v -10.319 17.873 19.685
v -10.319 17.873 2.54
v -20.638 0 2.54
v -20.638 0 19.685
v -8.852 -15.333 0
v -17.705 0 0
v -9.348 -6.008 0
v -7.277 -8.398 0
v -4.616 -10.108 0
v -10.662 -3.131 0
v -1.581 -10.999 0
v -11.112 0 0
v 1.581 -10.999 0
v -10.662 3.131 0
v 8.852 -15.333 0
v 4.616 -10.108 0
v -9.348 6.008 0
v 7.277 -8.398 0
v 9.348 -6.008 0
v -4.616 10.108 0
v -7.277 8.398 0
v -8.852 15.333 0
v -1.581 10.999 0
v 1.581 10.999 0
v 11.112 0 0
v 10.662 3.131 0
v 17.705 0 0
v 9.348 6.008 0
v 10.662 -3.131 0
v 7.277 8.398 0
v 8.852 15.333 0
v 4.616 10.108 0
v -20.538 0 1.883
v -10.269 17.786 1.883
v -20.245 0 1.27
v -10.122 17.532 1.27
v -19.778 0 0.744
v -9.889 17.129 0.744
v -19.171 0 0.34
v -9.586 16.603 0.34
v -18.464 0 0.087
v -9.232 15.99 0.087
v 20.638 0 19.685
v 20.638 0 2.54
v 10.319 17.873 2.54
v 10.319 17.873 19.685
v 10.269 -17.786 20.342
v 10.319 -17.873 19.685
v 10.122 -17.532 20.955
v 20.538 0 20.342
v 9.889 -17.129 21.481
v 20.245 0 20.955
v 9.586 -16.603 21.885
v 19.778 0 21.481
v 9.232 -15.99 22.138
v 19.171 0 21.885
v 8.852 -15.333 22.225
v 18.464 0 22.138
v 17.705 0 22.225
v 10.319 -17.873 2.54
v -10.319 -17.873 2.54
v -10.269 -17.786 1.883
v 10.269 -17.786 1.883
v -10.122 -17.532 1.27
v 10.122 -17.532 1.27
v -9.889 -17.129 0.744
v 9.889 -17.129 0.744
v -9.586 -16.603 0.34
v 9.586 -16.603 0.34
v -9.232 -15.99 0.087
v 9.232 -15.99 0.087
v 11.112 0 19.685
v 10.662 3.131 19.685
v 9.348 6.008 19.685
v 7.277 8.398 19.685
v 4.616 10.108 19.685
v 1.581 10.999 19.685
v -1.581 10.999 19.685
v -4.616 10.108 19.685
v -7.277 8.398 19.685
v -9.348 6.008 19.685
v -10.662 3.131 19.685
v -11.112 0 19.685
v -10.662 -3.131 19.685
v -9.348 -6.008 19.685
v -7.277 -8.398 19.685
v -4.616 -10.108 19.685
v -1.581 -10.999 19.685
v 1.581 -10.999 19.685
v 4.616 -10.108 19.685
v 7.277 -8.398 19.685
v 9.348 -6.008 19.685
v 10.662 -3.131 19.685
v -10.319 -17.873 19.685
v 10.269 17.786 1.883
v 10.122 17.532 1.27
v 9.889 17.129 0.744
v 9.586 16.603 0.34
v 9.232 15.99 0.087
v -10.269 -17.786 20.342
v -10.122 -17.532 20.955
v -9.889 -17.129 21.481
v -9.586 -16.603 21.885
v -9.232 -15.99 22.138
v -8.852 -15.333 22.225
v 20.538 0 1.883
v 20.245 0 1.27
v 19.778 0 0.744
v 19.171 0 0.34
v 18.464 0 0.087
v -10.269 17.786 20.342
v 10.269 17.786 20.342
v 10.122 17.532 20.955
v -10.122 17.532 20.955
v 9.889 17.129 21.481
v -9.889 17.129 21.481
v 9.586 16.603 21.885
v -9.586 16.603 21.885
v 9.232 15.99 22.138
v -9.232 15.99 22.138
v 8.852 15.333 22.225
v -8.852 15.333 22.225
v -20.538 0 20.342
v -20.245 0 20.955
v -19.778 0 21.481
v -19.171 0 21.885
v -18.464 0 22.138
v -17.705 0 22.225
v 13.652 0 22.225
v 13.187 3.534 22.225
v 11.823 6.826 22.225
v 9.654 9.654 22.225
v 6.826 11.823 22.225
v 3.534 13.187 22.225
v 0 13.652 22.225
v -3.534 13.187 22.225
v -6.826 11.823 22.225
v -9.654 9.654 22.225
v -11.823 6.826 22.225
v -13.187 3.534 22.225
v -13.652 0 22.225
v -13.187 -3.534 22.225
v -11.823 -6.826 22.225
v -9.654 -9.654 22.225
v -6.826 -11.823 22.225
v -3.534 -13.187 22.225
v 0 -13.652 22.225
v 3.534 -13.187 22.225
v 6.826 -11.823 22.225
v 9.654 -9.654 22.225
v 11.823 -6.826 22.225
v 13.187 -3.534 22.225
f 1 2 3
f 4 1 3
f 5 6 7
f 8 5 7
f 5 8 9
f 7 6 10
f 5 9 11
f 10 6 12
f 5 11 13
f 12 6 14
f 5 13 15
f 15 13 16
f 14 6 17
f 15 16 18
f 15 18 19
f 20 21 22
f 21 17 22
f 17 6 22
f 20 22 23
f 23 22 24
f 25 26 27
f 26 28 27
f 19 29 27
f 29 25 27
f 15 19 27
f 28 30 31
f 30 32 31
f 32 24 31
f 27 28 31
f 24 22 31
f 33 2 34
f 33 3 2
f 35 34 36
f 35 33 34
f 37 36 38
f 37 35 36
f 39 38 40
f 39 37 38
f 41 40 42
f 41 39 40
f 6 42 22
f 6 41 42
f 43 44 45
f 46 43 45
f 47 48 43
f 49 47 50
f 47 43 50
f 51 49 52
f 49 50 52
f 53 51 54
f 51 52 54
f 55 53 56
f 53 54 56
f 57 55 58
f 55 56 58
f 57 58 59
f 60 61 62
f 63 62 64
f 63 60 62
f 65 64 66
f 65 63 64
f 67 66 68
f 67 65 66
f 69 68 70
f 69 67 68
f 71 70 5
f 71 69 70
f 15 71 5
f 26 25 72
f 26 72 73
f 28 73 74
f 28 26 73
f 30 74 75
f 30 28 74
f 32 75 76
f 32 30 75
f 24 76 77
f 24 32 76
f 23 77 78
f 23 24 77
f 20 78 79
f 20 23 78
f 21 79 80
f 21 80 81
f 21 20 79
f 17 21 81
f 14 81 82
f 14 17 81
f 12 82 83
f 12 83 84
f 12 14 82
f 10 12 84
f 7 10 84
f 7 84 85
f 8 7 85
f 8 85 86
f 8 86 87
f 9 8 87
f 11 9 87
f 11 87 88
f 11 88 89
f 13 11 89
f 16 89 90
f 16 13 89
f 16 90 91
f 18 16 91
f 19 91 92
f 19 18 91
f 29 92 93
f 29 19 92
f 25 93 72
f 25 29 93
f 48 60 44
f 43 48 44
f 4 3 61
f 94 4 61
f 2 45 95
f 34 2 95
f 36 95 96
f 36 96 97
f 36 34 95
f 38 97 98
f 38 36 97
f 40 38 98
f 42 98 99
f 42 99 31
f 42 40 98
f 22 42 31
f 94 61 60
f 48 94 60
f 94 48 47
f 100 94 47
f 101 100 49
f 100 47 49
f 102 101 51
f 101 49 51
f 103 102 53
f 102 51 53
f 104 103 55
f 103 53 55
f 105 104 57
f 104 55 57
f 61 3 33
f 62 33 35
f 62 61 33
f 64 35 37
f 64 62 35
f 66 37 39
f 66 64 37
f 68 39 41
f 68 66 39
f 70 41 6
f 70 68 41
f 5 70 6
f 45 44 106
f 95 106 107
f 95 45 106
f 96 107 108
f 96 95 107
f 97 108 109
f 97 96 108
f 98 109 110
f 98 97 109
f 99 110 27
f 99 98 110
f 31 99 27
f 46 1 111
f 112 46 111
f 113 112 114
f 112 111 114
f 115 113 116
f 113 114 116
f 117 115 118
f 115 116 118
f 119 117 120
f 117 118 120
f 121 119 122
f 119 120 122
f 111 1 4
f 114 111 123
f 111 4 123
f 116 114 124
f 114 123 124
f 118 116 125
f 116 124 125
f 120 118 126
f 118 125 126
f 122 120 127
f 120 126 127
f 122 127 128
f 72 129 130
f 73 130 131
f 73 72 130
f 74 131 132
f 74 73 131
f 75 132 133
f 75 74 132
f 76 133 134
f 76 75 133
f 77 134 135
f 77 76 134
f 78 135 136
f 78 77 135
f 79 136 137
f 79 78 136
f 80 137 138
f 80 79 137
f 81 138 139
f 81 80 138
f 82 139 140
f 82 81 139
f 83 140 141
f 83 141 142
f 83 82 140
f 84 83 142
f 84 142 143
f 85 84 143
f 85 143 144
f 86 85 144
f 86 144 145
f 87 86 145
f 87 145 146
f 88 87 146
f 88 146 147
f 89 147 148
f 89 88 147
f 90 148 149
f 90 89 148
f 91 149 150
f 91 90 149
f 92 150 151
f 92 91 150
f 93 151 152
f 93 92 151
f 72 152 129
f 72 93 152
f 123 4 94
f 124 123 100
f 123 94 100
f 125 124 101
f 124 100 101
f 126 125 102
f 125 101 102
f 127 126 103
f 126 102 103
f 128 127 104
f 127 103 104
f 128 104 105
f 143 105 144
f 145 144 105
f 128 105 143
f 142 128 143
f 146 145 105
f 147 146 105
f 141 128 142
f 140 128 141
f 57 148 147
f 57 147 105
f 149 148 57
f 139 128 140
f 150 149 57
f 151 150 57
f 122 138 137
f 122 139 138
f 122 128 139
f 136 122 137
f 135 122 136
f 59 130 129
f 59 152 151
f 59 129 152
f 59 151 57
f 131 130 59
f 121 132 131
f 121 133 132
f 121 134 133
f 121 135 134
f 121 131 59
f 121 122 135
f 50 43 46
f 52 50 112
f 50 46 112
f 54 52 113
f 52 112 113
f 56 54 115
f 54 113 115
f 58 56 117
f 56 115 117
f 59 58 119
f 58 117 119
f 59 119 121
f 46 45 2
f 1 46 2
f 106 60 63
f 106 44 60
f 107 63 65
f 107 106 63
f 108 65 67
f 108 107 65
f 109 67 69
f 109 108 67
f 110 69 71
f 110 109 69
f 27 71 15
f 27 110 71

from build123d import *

# Parameters (mm, degrees)
F0_R     = 11.1125
F1_DEPTH = 22.225
F2_R     = 2.54
F3_SIZE  = 2.54


with BuildPart() as f1:
    # F0 (on Top) → F1 (new body)
    with BuildSketch(Plane.XY):
        Polygon((10.31875, -17.872599), (20.6375, 0), (10.31875, 17.872599), (-10.31875, 17.872599), (-20.6375, 0), (-10.31875, -17.872599), align=None)
        Circle(F0_R, mode=Mode.SUBTRACT)
    extrude(amount=F1_DEPTH)

    # F2
    f2_edges = [f1.edges().sort_by_distance(p)[0] for p in [
        (0, -17.872599, 22.225),
        (15.478125, -8.9363, 22.225),
        (15.478125, 8.9363, 22.225),
        (0, 17.872599, 22.225),
        (-15.478125, 8.9363, 22.225),
        (-15.478125, -8.9363, 22.225),
        (0, -17.872599, 0),
        (-15.478125, -8.9363, 0),
        (-15.478125, 8.9363, 0),
        (0, 17.872599, 0),
        (15.478125, 8.9363, 0),
        (15.478125, -8.9363, 0),
    ]]
    fillet(f2_edges, radius=F2_R)

    # F3
    f3_edges = [f1.edges().sort_by_distance(p)[0] for p in [
        (-11.1125, 0, 22.225),
    ]]
    chamfer(f3_edges, length=F3_SIZE)


solid = f1.part
